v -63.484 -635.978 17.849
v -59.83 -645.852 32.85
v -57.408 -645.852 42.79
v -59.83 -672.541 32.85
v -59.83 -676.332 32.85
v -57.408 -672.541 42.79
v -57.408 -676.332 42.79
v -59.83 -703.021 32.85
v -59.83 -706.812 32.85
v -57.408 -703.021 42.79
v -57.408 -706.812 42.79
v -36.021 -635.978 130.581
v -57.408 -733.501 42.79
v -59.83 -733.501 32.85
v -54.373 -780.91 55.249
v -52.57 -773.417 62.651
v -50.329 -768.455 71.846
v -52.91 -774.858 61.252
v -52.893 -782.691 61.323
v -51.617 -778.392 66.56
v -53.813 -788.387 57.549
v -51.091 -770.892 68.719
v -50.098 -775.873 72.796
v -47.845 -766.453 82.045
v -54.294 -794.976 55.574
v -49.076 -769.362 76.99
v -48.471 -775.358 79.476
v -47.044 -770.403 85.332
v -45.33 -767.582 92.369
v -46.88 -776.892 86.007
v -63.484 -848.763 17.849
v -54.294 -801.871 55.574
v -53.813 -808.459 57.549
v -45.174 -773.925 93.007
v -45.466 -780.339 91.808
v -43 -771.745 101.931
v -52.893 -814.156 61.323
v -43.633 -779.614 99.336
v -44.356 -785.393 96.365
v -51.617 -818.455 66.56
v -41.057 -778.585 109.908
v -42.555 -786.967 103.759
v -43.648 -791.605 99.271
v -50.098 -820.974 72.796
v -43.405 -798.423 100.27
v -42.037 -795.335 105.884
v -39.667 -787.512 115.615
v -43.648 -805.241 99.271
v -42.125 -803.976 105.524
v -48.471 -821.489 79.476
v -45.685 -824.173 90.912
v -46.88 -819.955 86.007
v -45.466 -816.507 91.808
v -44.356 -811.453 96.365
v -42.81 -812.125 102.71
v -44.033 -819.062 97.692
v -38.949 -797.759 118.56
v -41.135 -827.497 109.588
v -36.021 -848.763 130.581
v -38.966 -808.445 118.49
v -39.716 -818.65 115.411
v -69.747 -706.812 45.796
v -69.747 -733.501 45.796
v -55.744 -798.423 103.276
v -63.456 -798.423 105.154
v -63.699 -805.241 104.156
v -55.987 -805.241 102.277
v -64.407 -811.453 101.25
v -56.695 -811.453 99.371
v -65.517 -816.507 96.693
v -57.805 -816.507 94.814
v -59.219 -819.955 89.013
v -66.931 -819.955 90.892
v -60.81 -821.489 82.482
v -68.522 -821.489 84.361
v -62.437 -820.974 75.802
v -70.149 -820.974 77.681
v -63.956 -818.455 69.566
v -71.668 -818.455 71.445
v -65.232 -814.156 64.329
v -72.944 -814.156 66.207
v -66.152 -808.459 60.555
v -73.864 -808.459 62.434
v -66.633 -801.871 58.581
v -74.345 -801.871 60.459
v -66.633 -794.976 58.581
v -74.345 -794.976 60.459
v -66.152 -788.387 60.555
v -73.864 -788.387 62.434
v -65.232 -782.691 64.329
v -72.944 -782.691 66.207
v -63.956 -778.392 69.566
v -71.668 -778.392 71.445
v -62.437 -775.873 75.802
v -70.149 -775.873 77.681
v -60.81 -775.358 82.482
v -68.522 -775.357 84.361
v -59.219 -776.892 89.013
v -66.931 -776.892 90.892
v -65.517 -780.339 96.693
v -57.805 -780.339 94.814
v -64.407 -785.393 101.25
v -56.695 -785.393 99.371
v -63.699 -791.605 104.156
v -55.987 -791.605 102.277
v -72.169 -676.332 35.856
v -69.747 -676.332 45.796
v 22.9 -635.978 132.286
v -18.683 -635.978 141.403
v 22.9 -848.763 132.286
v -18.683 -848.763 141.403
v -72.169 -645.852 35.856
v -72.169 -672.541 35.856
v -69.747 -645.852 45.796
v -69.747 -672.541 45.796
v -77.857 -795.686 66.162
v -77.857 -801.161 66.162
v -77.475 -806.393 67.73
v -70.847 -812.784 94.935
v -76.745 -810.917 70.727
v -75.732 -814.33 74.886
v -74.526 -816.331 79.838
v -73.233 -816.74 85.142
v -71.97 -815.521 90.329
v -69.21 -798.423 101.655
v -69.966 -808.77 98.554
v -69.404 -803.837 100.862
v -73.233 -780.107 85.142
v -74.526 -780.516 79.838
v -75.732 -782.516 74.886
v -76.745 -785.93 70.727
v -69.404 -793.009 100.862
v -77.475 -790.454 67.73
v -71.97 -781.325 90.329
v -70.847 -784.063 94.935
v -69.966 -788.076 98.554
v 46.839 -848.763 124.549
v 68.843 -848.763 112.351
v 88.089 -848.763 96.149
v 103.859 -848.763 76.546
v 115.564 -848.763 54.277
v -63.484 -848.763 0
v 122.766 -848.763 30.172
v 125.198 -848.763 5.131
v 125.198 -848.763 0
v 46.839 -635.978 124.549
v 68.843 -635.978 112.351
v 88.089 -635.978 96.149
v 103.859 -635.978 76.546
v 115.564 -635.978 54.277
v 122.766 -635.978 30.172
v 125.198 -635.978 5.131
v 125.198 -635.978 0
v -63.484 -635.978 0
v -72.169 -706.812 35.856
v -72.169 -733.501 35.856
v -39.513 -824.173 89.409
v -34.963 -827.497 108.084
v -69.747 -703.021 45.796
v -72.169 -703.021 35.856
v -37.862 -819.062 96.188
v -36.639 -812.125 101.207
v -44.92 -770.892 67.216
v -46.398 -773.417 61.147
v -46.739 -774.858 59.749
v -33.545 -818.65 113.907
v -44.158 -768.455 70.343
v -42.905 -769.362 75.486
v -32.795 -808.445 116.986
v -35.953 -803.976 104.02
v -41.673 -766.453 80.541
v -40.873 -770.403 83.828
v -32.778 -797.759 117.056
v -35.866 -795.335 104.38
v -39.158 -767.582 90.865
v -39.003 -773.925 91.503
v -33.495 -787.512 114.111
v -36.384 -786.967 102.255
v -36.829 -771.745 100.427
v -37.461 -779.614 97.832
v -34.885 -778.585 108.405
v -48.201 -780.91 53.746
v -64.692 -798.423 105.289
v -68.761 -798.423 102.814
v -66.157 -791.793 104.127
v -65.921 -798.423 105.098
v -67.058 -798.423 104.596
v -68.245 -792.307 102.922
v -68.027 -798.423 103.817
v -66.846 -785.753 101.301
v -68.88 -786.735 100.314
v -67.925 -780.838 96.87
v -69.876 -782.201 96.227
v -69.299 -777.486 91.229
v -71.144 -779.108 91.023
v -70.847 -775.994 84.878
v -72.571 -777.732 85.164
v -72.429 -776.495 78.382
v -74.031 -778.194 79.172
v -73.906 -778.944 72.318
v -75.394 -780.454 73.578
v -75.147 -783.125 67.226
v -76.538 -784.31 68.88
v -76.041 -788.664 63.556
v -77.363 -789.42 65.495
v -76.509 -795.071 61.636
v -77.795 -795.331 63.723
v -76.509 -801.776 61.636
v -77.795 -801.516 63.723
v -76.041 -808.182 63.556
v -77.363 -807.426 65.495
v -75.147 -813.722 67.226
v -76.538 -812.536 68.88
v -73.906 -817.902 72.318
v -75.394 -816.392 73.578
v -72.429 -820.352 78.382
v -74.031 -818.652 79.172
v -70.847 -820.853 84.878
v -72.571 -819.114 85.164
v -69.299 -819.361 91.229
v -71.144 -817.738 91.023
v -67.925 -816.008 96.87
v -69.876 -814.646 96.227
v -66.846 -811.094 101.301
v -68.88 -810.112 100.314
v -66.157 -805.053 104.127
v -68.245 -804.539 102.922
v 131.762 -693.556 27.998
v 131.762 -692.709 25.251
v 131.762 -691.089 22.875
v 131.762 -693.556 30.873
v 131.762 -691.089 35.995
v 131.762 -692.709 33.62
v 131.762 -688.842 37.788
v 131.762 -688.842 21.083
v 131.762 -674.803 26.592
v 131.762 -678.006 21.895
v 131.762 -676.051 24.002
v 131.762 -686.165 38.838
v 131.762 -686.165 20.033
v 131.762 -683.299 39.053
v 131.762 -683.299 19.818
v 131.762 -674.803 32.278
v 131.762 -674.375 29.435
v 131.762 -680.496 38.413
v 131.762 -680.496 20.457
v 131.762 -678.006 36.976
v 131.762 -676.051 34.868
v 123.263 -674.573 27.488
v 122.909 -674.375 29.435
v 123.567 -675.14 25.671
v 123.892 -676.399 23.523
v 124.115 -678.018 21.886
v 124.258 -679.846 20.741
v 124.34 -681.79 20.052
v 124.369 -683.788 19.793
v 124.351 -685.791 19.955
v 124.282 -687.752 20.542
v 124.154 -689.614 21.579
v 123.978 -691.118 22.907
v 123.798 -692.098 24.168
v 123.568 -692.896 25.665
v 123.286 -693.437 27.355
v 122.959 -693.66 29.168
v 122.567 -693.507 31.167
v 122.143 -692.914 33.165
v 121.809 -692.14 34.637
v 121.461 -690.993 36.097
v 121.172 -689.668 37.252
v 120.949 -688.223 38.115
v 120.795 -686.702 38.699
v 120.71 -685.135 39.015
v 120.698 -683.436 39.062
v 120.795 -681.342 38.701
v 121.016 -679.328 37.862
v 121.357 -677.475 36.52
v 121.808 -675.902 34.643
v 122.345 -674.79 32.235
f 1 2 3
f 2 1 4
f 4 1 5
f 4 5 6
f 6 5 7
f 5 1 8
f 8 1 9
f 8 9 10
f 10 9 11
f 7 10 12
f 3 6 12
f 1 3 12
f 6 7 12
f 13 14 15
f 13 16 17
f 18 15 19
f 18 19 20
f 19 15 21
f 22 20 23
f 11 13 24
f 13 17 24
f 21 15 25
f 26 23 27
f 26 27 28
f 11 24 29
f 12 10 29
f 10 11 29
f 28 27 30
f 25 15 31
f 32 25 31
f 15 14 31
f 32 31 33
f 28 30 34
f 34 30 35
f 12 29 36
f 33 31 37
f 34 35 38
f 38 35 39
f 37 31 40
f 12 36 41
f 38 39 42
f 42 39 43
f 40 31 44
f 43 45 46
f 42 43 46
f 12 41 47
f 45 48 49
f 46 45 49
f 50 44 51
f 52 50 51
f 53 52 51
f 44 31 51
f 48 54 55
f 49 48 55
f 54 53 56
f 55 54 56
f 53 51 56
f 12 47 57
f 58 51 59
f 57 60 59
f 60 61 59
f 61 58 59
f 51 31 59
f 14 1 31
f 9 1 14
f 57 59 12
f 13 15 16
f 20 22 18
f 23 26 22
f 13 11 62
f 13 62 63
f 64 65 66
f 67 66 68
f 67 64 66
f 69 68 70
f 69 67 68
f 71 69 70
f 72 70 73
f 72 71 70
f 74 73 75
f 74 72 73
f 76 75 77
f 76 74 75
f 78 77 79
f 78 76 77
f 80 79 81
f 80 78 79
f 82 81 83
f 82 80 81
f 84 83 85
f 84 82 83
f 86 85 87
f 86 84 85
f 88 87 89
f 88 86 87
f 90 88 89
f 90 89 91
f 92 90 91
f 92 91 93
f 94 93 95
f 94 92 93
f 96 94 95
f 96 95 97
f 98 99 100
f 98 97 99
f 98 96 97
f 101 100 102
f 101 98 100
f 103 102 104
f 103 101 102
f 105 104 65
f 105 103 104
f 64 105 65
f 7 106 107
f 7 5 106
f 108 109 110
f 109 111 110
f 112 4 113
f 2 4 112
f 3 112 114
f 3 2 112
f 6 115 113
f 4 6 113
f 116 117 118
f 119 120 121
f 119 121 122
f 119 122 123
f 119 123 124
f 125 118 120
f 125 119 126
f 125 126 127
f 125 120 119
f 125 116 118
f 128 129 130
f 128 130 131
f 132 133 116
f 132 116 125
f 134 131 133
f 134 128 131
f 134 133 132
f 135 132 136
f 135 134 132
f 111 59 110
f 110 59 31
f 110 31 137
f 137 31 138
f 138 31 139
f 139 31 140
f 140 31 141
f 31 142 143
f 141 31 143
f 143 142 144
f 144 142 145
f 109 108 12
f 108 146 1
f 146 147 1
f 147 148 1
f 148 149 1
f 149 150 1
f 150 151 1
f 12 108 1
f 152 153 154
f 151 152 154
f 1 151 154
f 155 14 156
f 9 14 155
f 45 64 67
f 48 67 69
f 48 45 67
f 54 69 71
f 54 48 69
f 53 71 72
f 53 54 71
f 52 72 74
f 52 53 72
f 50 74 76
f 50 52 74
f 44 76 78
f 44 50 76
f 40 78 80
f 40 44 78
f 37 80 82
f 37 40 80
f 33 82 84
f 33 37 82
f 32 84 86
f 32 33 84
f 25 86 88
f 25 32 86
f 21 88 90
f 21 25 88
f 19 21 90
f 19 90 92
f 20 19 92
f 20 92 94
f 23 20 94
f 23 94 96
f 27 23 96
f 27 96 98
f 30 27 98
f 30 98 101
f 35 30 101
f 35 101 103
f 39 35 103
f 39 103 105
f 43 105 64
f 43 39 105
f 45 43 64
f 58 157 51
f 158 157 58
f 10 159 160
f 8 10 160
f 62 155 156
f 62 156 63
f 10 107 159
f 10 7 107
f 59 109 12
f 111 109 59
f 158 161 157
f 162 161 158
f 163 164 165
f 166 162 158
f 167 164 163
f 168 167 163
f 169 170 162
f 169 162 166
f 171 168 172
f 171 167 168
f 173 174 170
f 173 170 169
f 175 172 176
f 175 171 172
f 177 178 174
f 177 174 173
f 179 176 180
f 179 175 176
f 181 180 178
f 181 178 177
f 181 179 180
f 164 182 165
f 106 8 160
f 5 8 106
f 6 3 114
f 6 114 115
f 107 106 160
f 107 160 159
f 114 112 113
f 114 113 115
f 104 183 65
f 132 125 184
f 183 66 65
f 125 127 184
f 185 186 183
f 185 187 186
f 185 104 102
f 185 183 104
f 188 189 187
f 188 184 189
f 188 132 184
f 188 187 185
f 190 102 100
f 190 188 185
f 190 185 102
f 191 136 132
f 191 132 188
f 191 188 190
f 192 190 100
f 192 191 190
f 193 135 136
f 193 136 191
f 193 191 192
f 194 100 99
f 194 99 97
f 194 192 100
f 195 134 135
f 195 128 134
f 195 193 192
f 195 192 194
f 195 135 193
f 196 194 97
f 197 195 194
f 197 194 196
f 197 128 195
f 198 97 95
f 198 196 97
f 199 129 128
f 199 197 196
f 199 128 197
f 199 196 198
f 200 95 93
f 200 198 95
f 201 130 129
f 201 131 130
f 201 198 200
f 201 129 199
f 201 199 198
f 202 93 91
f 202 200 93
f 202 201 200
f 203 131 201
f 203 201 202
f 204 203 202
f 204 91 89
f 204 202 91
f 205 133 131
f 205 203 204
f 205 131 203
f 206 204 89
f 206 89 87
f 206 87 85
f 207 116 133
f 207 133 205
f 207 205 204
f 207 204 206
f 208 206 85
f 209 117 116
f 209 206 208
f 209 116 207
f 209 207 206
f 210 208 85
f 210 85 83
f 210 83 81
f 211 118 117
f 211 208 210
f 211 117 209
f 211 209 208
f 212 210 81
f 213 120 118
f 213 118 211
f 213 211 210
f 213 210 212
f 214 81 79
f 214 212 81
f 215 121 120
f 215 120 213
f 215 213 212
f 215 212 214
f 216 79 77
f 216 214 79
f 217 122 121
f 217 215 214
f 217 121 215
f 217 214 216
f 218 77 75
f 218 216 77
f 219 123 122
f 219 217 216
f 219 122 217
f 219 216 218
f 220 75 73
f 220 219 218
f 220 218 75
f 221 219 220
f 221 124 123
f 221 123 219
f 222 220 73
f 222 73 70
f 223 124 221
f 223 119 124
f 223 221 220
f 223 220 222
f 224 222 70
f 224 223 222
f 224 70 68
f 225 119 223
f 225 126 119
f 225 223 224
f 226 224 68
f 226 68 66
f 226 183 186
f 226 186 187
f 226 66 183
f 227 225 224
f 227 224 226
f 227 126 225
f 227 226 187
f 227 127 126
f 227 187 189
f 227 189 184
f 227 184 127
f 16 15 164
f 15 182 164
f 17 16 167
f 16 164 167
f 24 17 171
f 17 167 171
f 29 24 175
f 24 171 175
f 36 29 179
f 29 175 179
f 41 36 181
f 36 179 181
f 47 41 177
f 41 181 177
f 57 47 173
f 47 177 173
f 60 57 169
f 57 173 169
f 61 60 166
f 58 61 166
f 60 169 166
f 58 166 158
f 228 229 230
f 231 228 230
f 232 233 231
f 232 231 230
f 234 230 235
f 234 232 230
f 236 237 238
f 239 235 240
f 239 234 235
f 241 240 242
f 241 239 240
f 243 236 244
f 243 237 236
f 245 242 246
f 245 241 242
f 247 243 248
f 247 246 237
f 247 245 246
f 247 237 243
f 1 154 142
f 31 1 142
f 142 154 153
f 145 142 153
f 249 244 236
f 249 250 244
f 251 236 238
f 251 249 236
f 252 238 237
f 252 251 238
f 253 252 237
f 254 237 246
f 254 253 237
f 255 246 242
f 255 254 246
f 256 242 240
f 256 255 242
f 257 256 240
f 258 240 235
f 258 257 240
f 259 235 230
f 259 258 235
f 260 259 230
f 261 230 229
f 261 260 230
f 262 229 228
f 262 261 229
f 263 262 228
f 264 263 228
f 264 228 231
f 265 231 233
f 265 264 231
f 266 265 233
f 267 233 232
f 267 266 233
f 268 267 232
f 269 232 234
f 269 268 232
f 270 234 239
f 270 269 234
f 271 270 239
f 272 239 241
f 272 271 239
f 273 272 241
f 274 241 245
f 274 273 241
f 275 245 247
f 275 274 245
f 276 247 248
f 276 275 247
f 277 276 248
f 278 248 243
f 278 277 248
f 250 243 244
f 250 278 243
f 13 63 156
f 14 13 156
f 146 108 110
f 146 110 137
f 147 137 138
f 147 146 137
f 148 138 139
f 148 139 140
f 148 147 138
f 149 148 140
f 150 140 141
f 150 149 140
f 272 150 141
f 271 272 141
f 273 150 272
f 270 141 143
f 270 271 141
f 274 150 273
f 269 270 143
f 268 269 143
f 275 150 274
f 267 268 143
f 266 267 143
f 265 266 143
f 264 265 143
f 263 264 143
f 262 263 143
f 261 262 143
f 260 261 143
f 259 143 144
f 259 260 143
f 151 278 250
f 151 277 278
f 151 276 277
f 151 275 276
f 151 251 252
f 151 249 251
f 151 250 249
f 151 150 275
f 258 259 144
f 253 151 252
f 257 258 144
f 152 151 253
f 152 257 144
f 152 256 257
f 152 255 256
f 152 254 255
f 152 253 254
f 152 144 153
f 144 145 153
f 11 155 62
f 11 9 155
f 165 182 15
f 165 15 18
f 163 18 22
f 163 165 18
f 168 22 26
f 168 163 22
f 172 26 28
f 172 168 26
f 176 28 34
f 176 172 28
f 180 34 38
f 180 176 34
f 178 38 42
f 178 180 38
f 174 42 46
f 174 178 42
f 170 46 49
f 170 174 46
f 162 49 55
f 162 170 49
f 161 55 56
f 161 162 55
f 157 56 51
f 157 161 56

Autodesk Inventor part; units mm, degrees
ref_plane "XZ Plane" through (0, 0, 0) normal (0, 1, 0) x (-1, 0, 0)
ref_plane "XY Plane" through (0, 0, 0) normal (0, 0, 1) x (1, 0, 0)
sketch "Sketch1" plane through (0, 0, 0) normal (0, 0, 1) x (1, 0, 0)
  line L0 (125.1975, -635.9781) -> (-63.4844, -635.9781)
  line L1 (-63.4844, -635.9781) -> (-63.4844, -848.7632)
  line L2 (-63.4844, -848.7632) -> (125.1975, -848.7632)
  line L3 (125.1975, -848.7632) -> (125.1975, -635.9781)
  point P0 (0, 0)
extrude "Extrusion1" add sketch "Sketch1" along normal blind 144.4625
sketch "Sketch2" plane through (-63.4844, -848.7632, 0) normal (0, -1, 0) x (1, 0, 0)
  line L0 (188.6819, 144.4625) -> (0, 144.4625) projected
  line L1 (0, 0) -> (0, 144.4625) projected
  line L2 (188.6819, 0) -> (188.6819, 144.4625) projected
  line L3 (0, 17.8487) -> (30.8457, 144.4625)
  line L4 (30.8457, 144.4625) -> (188.6819, 109.8581)
  point P0 (63.4844, 0)
extrude "Extrusion2" cut sketch "Sketch2" against normal through all
sketch "Sketch3" plane through (-63.4844, -848.7632, 17.8487) normal (-0.9715834, 0, 0.2366975) x (0.2366975, 0, 0.9715834)
  line L0 (0, 0) -> (0, 212.7851) projected
  circle A0 centre (61.7012, 50.3399) radius 23.1304
  line L1 (15.4405, 202.9114) -> (25.6712, 202.9114)
  line L2 (25.6712, 202.9114) -> (25.6712, 176.2225)
  line L3 (25.6712, 176.2225) -> (15.4405, 176.2225)
  line L4 (15.4405, 176.2225) -> (15.4405, 202.9114)
  line L5 (15.4405, 172.4314) -> (25.6712, 172.4314)
  line L6 (25.6712, 172.4314) -> (25.6712, 145.7425)
  line L7 (25.6712, 145.7425) -> (15.4405, 145.7425)
  line L8 (15.4405, 145.7425) -> (15.4405, 172.4314)
  line L9 (15.4405, 141.9514) -> (25.6712, 141.9514)
  line L10 (25.6712, 141.9514) -> (25.6712, 115.2625)
  line L11 (25.6712, 115.2625) -> (15.4405, 115.2625)
  line L12 (15.4405, 115.2625) -> (15.4405, 141.9514)
  point P0 (-2.3149, 848.7632)
  dimension "d6" = 30.48
extrude "Extrusion3" add sketch "Sketch3" along normal blind 12.7
sketch "Sketch4" plane through (-61.219, -798.4232, 80.8026) normal (-0.9715834, 0, 0.2366975) x (0.2366975, 0, 0.9715834)
  circle A0 centre (0, 0) radius 23.1304 projected
  point P0 (-64.0161, 798.4232)
extrude "Extrusion4" add sketch "Sketch4" along normal blind 12.7
sketch "Sketch5" plane through (-63.4844, -848.7632, 17.8487) normal (-0.9715834, 0, 0.2366975) x (0.2366975, 0, 0.9715834)
  circle A0 centre (61.7012, 50.3399) radius 23.1304 projected
  circle A1 centre (61.7012, 50.3399) radius 29.0734 construction
  circle A2 centre (61.7012, 50.3399) radius 43.7714 construction
  line L0 (61.7012, 50.3399) -> (82.0253, 11.5731) construction
  arc A3 (94.4221, 21.2663) -> (38.4943, 67.8529) centre (67.5786, 45.9046) ccw
  line L1 (75.2007, 24.5906) -> (94.4221, 21.2663)
  arc A4 (75.2007, 24.5906) -> (38.4943, 67.8529) centre (61.7012, 50.3399) ccw
  point P0 (-2.3149, 848.7632)
  dimension "d15" = 87.5428
  dimension "d16" = 58.1469
extrude "Extrusion5" cut sketch "Sketch5" along normal mid plane 12.7 contours L1 A4 A3
fillet "Fillet1" radius 130.175 1 edges at (125.1975, -742.3706, 109.8581)
fillet "Fillet2" radius 4.7625 1 edges at (-79.033, -798.4232, 61.3356)
chamfer "Chamfer1" distance 14.2875 angle 45 1 edges at (-32.6387, -742.3706, 144.4625)
ref_plane "Work Plane1" through (119.0625, 0, 0) normal (1, 0, 0) x (0, 1, 0)
sketch "Sketch6" plane through (119.0625, 0, 0) normal (1, 0, 0) x (0, 1, 0)
  circle A0 centre (-684.0193, 29.4352) radius 9.6445
  point P0 (0, 0)
extrude "Extrusion6" add sketch "Sketch6" along normal blind 12.7
properties part number "VoltageSource"
